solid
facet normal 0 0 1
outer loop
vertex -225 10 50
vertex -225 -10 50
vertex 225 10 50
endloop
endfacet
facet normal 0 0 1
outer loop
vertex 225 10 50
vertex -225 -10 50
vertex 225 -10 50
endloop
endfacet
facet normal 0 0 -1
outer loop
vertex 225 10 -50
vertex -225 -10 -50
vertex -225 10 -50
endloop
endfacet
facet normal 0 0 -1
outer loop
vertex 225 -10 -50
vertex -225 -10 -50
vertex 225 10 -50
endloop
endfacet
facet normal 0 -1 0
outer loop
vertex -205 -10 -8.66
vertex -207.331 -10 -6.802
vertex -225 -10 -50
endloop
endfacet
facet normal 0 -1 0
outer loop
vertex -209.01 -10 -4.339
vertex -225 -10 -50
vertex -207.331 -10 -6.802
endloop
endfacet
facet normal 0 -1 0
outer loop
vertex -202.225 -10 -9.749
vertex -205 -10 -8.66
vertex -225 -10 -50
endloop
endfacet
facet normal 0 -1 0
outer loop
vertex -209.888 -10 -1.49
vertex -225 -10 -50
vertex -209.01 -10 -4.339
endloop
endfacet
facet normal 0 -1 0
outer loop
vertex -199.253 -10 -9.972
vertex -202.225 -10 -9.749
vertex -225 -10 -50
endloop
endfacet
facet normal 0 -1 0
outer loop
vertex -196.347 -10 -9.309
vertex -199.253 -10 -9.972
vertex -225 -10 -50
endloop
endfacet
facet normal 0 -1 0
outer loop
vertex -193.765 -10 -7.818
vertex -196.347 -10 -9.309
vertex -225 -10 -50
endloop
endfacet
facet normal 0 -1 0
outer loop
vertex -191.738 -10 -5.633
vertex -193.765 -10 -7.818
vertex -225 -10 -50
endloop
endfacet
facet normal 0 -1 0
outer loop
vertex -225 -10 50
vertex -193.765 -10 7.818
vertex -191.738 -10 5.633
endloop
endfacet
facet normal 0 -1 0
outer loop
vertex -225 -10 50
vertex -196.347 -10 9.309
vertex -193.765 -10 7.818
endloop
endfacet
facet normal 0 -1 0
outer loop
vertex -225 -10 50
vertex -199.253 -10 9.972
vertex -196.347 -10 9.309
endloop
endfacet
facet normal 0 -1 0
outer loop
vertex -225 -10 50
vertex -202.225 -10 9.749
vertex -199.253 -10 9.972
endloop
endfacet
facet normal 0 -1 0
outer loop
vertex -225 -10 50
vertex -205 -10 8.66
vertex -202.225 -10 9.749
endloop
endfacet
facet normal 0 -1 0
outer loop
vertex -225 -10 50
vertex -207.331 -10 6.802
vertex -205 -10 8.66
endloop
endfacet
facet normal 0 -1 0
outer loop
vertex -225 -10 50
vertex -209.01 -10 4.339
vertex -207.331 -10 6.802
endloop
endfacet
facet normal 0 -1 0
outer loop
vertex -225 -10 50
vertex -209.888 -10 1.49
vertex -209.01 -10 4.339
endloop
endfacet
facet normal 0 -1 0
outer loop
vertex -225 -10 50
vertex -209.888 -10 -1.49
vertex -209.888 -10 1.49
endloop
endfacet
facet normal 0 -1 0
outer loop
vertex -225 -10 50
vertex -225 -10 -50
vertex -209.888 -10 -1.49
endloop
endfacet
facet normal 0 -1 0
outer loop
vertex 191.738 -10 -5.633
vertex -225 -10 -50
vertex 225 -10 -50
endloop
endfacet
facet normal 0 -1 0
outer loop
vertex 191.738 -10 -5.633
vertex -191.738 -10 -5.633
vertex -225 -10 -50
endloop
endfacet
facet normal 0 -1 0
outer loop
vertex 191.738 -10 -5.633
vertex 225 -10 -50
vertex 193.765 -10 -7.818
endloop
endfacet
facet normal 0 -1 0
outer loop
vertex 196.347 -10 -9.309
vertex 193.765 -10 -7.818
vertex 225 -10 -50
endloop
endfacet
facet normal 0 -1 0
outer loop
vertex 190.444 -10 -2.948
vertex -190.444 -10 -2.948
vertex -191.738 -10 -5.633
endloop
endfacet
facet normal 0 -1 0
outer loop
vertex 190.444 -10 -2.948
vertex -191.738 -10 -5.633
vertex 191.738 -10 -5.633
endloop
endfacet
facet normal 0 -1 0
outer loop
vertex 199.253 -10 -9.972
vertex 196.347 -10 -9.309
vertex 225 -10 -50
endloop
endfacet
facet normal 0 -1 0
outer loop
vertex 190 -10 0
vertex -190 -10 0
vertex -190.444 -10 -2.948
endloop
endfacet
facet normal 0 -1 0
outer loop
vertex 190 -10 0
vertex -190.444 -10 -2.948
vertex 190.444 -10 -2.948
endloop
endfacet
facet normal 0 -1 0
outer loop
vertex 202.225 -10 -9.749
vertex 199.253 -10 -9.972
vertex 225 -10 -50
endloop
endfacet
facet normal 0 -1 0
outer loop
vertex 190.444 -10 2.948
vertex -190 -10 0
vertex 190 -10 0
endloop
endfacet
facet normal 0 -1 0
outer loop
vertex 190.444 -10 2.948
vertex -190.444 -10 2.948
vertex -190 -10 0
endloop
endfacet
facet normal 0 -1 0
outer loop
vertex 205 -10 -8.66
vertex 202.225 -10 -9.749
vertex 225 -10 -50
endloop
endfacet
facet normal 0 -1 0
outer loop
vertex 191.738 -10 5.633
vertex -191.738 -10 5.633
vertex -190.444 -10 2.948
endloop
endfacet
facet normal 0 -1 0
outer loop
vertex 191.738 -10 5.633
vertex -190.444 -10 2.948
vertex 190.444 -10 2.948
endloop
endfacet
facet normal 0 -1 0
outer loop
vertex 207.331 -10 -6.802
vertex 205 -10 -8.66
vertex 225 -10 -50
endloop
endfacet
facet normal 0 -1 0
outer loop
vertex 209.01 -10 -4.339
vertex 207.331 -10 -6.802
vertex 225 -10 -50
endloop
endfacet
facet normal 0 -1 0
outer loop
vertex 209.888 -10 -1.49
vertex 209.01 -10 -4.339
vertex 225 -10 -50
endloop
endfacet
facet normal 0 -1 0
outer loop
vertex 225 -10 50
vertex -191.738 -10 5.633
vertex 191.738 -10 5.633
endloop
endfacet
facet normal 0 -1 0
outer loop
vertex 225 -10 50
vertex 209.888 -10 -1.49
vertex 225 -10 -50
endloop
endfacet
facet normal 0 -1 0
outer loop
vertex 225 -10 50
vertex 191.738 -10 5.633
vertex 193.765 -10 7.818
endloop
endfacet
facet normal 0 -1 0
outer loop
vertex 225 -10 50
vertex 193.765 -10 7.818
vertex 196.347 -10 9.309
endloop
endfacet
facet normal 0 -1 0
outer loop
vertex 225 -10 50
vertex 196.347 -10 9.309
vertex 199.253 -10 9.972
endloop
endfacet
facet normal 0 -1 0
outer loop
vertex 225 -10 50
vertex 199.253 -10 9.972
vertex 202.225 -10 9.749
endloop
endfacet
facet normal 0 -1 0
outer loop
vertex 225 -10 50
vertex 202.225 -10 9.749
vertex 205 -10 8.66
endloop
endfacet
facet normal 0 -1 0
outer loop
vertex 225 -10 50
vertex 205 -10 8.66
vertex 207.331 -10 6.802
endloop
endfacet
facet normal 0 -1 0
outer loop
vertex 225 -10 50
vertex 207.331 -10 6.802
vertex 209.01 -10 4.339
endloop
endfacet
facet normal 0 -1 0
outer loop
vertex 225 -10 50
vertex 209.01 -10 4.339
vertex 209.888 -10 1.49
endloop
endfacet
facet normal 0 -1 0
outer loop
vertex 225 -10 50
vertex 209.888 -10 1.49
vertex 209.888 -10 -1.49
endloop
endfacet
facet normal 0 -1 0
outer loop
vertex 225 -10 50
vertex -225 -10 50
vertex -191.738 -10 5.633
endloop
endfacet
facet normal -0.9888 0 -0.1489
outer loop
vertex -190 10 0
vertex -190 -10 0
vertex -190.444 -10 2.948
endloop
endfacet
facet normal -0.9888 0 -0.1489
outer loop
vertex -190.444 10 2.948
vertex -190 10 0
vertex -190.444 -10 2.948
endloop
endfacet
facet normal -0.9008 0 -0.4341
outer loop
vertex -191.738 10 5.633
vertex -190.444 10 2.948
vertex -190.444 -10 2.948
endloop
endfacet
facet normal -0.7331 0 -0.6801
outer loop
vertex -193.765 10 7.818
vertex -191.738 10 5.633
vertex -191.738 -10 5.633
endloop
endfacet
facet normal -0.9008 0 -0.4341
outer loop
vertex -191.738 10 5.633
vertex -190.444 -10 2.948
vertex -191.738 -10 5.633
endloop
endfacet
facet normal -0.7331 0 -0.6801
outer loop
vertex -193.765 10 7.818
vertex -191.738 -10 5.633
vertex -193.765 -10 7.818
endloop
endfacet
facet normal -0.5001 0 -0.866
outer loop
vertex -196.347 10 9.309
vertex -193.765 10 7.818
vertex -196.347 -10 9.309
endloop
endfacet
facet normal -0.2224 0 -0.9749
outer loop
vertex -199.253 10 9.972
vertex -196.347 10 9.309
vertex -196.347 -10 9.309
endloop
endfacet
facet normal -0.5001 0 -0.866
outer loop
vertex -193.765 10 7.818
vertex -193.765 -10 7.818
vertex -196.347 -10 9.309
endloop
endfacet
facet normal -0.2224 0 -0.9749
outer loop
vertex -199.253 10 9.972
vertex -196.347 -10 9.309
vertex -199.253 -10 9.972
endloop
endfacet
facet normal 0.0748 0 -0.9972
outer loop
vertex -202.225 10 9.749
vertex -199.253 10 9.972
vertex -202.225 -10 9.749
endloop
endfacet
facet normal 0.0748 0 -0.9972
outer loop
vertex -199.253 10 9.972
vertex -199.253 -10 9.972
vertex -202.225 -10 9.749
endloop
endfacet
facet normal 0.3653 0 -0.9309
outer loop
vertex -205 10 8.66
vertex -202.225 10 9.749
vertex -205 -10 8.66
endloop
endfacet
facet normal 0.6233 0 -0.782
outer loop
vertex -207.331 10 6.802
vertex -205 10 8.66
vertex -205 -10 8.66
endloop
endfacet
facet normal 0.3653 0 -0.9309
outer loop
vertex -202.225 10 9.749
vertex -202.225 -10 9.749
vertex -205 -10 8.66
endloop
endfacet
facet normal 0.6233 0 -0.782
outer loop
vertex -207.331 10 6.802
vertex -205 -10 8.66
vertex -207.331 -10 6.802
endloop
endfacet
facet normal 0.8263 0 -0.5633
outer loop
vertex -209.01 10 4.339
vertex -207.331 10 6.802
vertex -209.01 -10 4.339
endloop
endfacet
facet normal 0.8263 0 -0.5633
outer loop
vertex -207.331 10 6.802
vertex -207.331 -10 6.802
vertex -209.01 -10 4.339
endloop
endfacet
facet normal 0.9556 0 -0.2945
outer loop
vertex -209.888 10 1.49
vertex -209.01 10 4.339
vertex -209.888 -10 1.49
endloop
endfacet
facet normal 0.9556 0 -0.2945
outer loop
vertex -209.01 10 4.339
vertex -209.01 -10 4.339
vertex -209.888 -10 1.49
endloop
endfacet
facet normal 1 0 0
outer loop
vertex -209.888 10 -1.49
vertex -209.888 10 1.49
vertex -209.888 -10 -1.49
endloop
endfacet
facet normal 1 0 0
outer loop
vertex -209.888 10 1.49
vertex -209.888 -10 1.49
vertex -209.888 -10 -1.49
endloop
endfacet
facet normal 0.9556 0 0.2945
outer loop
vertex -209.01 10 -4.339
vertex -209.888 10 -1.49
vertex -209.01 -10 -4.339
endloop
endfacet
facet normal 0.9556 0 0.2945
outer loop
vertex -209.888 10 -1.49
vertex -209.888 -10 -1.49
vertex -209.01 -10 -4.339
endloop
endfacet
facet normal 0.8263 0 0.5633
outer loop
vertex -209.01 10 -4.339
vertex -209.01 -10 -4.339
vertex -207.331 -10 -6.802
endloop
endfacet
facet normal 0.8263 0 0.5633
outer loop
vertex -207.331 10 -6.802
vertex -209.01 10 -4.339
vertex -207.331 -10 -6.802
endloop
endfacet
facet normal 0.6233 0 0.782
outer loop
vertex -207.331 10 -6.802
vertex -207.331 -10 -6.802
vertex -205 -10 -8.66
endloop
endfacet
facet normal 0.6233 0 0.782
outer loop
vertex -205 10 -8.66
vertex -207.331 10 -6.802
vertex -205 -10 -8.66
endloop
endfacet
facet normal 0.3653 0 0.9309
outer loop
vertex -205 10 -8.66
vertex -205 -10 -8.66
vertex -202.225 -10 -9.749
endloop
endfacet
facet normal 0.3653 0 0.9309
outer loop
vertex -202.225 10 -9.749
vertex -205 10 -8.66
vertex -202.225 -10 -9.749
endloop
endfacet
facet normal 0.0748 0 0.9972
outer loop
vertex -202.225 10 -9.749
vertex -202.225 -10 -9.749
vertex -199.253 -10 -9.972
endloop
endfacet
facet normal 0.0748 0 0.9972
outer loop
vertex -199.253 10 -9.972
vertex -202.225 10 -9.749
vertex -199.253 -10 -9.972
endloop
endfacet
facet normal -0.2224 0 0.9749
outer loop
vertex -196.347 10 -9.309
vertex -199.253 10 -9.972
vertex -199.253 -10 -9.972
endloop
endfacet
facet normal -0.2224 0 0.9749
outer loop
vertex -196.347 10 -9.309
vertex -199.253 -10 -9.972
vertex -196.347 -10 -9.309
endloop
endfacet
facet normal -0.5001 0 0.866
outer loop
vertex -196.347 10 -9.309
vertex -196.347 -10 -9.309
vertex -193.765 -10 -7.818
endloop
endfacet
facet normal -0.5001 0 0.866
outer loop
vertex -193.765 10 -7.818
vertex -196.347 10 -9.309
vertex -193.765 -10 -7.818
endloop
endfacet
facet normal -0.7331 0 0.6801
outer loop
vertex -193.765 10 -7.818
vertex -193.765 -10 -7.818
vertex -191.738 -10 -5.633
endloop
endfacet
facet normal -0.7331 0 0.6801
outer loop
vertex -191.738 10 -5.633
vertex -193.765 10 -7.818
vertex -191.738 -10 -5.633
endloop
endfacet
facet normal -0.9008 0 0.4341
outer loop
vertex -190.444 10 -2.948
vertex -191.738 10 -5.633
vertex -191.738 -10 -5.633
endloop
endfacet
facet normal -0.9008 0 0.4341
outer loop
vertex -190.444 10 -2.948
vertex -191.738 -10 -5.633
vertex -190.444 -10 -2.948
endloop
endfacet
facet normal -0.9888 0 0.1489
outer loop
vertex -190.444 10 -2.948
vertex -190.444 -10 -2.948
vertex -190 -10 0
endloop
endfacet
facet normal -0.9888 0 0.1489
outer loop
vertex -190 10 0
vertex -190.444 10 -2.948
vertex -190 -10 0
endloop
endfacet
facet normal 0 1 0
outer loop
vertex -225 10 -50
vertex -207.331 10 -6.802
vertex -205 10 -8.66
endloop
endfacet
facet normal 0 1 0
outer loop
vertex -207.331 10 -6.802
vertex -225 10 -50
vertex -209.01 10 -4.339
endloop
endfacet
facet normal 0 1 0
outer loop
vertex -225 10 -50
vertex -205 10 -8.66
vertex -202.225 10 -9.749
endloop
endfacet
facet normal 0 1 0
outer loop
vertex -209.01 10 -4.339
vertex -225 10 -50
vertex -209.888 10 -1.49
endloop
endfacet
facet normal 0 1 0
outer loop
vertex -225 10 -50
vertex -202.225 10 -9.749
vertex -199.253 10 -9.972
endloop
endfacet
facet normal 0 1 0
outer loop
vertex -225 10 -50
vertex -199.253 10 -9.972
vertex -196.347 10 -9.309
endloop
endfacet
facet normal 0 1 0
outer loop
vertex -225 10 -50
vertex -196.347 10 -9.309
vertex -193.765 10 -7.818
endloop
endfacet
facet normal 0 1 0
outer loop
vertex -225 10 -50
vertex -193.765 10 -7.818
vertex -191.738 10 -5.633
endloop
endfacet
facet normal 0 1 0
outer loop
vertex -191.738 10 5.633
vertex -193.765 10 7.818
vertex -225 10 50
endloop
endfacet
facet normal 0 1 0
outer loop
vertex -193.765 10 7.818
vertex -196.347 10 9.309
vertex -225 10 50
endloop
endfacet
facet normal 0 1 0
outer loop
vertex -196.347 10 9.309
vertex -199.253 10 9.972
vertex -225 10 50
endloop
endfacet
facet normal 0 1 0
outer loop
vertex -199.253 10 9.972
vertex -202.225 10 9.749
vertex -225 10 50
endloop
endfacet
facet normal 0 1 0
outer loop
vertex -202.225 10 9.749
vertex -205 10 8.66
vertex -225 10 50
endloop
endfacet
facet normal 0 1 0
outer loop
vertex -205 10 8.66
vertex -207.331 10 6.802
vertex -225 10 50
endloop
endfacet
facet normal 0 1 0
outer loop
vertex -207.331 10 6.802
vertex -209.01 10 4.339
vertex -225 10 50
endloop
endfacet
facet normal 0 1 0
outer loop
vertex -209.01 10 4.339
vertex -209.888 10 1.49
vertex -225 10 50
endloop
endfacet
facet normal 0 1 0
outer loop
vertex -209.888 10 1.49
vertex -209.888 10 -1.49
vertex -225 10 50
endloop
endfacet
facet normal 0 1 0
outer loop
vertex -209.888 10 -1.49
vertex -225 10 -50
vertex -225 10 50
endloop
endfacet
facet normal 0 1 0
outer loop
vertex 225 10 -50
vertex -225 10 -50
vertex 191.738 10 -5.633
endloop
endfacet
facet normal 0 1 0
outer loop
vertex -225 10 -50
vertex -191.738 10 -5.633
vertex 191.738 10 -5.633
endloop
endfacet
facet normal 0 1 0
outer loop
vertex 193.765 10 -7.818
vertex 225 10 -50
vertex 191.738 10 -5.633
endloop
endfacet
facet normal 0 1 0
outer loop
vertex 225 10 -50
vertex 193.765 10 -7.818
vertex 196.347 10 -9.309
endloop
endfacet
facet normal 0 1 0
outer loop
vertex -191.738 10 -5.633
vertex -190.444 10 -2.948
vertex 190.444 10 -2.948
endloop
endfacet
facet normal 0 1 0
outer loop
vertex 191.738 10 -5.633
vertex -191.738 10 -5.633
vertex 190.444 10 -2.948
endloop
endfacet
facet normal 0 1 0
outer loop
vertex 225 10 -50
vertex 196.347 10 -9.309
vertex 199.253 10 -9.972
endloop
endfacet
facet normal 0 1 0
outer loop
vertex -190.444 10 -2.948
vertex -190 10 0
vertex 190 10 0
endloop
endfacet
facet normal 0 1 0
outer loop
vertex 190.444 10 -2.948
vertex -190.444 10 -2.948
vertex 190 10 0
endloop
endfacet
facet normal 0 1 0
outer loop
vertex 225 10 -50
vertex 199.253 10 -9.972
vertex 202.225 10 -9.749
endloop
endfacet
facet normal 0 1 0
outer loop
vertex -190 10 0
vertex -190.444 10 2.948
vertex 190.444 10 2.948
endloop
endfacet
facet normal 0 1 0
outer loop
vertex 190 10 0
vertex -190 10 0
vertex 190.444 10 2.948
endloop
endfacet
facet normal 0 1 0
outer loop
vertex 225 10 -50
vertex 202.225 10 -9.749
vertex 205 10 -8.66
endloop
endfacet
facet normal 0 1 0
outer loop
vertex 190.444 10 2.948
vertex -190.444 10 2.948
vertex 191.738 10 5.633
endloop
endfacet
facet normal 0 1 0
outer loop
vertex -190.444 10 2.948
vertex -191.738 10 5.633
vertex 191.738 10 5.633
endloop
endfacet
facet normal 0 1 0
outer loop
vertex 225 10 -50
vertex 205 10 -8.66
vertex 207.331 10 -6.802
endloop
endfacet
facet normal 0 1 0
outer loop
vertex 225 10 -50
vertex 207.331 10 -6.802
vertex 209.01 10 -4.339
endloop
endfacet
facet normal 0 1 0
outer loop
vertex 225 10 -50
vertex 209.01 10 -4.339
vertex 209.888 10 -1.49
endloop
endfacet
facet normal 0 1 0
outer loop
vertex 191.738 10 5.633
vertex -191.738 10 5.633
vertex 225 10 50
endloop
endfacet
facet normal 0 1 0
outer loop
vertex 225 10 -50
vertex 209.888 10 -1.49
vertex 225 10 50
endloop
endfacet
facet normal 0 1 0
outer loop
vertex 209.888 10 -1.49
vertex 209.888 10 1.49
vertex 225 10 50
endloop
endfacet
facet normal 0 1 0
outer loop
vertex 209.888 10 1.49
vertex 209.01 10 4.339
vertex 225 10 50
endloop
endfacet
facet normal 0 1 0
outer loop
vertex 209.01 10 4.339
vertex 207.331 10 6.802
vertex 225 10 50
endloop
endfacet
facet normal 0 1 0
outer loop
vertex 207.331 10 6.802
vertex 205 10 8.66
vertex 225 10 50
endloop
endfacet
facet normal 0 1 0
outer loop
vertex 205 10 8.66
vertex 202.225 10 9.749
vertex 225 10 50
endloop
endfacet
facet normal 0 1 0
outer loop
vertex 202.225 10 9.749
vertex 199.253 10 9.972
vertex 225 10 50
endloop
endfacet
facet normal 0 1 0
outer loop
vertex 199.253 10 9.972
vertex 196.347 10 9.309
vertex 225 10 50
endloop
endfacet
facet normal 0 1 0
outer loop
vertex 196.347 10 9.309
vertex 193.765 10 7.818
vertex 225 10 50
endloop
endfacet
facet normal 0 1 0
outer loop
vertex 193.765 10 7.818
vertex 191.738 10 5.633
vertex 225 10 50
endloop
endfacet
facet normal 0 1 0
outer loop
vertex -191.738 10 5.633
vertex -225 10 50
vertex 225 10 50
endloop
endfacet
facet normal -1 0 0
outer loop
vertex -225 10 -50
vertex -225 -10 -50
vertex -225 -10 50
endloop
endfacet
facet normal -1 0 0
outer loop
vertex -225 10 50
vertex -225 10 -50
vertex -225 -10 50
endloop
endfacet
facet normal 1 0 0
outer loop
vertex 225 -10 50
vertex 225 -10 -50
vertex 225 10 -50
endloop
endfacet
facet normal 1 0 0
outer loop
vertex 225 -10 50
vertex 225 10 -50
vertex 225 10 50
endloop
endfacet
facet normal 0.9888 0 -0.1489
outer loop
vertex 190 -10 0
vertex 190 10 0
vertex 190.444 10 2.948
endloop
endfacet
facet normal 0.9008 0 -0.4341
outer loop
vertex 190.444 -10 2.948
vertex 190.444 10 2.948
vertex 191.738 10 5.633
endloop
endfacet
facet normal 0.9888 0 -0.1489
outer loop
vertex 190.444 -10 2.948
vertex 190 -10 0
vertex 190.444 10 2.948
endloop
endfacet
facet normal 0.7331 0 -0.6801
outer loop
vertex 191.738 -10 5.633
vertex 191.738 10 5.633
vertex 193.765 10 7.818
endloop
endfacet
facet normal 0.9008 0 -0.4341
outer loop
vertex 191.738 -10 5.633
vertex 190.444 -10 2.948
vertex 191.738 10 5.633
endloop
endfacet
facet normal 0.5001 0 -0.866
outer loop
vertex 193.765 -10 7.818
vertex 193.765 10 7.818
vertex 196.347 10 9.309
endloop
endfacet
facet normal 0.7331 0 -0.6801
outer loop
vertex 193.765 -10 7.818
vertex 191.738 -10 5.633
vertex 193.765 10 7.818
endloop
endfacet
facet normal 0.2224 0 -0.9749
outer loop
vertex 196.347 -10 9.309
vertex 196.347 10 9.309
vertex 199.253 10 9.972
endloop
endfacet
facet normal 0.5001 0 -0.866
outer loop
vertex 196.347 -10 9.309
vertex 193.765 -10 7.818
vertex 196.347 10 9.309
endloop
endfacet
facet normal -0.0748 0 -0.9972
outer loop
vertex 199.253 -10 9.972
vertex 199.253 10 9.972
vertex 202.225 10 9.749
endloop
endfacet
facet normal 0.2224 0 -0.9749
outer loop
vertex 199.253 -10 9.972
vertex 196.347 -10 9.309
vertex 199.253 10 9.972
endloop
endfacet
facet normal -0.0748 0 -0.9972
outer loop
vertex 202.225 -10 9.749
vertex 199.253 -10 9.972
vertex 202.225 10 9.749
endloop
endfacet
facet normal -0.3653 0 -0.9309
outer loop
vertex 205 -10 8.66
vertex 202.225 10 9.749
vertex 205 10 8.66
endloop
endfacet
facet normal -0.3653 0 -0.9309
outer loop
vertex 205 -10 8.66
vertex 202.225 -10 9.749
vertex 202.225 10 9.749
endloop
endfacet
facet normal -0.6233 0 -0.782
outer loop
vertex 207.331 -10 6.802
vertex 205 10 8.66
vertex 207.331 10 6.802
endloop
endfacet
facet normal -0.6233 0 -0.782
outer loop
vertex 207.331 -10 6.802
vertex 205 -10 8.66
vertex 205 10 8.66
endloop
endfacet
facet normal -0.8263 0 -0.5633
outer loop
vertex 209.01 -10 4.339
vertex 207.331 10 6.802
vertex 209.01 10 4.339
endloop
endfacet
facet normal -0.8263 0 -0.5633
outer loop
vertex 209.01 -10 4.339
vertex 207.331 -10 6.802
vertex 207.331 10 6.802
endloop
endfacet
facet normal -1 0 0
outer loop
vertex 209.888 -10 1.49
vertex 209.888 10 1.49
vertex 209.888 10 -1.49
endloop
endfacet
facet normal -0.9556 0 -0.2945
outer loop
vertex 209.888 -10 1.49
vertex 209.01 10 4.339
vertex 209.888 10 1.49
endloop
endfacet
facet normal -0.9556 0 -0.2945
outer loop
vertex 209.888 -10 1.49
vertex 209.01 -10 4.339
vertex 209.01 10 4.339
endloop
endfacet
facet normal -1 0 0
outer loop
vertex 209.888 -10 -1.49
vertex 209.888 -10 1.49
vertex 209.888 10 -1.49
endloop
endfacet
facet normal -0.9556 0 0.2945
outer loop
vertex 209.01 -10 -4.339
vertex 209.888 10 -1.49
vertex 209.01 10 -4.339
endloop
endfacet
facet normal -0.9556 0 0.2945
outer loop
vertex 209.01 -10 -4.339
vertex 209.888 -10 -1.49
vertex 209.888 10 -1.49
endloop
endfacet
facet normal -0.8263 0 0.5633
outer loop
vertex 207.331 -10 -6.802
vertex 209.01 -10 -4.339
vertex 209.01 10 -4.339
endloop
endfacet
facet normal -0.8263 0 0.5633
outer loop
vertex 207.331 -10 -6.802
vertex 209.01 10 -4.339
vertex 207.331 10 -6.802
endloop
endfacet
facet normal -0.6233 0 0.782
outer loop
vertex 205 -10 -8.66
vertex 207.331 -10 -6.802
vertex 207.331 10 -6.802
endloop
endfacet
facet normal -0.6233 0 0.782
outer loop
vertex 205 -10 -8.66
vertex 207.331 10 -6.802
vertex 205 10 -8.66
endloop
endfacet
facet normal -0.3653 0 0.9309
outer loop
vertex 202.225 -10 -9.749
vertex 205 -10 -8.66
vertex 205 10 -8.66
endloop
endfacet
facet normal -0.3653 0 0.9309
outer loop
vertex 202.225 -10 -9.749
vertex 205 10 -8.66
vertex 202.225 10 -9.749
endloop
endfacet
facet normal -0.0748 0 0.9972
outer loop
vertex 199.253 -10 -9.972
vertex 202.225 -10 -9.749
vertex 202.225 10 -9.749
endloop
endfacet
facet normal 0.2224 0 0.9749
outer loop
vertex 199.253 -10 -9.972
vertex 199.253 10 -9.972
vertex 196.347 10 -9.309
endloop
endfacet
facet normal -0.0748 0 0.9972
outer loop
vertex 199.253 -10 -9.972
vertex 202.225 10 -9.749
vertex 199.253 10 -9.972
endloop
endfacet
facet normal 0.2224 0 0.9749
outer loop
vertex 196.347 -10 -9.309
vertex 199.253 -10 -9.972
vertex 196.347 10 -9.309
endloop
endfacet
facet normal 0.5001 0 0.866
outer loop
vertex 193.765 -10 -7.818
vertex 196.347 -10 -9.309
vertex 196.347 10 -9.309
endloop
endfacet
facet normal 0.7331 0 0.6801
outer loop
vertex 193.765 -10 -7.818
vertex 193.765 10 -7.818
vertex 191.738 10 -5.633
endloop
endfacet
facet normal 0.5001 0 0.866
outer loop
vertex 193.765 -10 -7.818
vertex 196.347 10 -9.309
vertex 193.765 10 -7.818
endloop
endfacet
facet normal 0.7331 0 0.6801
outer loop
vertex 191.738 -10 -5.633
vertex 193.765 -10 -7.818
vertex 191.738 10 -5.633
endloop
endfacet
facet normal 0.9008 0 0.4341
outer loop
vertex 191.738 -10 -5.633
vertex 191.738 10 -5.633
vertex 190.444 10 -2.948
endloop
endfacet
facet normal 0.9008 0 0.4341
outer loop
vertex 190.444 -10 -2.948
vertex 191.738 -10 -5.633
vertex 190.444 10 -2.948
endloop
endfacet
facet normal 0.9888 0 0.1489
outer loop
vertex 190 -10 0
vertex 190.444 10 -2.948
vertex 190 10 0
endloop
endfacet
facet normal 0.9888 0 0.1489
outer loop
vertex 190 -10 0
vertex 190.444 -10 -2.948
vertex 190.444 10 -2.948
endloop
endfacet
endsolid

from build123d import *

# Parameters (mm, degrees)
F0_W     = 450
F0_H     = 100
F1_DEPTH = 10
F2_R     = 10
F3_DEPTH = 20.001


# Not quite as in the source:
# - a pattern or mirror of a feature is missing from the dataset's text; its kind, count and spacing are read off the source's solid


with BuildPart() as f1:
    # F0 (on Front) → F1 (new body, symmetric)
    with BuildSketch(Plane.XZ):
        Rectangle(F0_W, F0_H)
    extrude(amount=F1_DEPTH, both=True)

    # F2 (on face) → F3 (cut, through all)
    with BuildSketch(Plane.XZ.offset(10)):
        with Locations((-200, 0)):
            Circle(F2_R)
    f3 = extrude(amount=-F3_DEPTH, mode=Mode.SUBTRACT)

    # F3_copies: F3 across plane
    add(f3.mirror(Plane(origin=(0, 0, 0), x_dir=(0, 0, 1), z_dir=(1, 0, 0))), mode=Mode.SUBTRACT)


solid = f1.part
